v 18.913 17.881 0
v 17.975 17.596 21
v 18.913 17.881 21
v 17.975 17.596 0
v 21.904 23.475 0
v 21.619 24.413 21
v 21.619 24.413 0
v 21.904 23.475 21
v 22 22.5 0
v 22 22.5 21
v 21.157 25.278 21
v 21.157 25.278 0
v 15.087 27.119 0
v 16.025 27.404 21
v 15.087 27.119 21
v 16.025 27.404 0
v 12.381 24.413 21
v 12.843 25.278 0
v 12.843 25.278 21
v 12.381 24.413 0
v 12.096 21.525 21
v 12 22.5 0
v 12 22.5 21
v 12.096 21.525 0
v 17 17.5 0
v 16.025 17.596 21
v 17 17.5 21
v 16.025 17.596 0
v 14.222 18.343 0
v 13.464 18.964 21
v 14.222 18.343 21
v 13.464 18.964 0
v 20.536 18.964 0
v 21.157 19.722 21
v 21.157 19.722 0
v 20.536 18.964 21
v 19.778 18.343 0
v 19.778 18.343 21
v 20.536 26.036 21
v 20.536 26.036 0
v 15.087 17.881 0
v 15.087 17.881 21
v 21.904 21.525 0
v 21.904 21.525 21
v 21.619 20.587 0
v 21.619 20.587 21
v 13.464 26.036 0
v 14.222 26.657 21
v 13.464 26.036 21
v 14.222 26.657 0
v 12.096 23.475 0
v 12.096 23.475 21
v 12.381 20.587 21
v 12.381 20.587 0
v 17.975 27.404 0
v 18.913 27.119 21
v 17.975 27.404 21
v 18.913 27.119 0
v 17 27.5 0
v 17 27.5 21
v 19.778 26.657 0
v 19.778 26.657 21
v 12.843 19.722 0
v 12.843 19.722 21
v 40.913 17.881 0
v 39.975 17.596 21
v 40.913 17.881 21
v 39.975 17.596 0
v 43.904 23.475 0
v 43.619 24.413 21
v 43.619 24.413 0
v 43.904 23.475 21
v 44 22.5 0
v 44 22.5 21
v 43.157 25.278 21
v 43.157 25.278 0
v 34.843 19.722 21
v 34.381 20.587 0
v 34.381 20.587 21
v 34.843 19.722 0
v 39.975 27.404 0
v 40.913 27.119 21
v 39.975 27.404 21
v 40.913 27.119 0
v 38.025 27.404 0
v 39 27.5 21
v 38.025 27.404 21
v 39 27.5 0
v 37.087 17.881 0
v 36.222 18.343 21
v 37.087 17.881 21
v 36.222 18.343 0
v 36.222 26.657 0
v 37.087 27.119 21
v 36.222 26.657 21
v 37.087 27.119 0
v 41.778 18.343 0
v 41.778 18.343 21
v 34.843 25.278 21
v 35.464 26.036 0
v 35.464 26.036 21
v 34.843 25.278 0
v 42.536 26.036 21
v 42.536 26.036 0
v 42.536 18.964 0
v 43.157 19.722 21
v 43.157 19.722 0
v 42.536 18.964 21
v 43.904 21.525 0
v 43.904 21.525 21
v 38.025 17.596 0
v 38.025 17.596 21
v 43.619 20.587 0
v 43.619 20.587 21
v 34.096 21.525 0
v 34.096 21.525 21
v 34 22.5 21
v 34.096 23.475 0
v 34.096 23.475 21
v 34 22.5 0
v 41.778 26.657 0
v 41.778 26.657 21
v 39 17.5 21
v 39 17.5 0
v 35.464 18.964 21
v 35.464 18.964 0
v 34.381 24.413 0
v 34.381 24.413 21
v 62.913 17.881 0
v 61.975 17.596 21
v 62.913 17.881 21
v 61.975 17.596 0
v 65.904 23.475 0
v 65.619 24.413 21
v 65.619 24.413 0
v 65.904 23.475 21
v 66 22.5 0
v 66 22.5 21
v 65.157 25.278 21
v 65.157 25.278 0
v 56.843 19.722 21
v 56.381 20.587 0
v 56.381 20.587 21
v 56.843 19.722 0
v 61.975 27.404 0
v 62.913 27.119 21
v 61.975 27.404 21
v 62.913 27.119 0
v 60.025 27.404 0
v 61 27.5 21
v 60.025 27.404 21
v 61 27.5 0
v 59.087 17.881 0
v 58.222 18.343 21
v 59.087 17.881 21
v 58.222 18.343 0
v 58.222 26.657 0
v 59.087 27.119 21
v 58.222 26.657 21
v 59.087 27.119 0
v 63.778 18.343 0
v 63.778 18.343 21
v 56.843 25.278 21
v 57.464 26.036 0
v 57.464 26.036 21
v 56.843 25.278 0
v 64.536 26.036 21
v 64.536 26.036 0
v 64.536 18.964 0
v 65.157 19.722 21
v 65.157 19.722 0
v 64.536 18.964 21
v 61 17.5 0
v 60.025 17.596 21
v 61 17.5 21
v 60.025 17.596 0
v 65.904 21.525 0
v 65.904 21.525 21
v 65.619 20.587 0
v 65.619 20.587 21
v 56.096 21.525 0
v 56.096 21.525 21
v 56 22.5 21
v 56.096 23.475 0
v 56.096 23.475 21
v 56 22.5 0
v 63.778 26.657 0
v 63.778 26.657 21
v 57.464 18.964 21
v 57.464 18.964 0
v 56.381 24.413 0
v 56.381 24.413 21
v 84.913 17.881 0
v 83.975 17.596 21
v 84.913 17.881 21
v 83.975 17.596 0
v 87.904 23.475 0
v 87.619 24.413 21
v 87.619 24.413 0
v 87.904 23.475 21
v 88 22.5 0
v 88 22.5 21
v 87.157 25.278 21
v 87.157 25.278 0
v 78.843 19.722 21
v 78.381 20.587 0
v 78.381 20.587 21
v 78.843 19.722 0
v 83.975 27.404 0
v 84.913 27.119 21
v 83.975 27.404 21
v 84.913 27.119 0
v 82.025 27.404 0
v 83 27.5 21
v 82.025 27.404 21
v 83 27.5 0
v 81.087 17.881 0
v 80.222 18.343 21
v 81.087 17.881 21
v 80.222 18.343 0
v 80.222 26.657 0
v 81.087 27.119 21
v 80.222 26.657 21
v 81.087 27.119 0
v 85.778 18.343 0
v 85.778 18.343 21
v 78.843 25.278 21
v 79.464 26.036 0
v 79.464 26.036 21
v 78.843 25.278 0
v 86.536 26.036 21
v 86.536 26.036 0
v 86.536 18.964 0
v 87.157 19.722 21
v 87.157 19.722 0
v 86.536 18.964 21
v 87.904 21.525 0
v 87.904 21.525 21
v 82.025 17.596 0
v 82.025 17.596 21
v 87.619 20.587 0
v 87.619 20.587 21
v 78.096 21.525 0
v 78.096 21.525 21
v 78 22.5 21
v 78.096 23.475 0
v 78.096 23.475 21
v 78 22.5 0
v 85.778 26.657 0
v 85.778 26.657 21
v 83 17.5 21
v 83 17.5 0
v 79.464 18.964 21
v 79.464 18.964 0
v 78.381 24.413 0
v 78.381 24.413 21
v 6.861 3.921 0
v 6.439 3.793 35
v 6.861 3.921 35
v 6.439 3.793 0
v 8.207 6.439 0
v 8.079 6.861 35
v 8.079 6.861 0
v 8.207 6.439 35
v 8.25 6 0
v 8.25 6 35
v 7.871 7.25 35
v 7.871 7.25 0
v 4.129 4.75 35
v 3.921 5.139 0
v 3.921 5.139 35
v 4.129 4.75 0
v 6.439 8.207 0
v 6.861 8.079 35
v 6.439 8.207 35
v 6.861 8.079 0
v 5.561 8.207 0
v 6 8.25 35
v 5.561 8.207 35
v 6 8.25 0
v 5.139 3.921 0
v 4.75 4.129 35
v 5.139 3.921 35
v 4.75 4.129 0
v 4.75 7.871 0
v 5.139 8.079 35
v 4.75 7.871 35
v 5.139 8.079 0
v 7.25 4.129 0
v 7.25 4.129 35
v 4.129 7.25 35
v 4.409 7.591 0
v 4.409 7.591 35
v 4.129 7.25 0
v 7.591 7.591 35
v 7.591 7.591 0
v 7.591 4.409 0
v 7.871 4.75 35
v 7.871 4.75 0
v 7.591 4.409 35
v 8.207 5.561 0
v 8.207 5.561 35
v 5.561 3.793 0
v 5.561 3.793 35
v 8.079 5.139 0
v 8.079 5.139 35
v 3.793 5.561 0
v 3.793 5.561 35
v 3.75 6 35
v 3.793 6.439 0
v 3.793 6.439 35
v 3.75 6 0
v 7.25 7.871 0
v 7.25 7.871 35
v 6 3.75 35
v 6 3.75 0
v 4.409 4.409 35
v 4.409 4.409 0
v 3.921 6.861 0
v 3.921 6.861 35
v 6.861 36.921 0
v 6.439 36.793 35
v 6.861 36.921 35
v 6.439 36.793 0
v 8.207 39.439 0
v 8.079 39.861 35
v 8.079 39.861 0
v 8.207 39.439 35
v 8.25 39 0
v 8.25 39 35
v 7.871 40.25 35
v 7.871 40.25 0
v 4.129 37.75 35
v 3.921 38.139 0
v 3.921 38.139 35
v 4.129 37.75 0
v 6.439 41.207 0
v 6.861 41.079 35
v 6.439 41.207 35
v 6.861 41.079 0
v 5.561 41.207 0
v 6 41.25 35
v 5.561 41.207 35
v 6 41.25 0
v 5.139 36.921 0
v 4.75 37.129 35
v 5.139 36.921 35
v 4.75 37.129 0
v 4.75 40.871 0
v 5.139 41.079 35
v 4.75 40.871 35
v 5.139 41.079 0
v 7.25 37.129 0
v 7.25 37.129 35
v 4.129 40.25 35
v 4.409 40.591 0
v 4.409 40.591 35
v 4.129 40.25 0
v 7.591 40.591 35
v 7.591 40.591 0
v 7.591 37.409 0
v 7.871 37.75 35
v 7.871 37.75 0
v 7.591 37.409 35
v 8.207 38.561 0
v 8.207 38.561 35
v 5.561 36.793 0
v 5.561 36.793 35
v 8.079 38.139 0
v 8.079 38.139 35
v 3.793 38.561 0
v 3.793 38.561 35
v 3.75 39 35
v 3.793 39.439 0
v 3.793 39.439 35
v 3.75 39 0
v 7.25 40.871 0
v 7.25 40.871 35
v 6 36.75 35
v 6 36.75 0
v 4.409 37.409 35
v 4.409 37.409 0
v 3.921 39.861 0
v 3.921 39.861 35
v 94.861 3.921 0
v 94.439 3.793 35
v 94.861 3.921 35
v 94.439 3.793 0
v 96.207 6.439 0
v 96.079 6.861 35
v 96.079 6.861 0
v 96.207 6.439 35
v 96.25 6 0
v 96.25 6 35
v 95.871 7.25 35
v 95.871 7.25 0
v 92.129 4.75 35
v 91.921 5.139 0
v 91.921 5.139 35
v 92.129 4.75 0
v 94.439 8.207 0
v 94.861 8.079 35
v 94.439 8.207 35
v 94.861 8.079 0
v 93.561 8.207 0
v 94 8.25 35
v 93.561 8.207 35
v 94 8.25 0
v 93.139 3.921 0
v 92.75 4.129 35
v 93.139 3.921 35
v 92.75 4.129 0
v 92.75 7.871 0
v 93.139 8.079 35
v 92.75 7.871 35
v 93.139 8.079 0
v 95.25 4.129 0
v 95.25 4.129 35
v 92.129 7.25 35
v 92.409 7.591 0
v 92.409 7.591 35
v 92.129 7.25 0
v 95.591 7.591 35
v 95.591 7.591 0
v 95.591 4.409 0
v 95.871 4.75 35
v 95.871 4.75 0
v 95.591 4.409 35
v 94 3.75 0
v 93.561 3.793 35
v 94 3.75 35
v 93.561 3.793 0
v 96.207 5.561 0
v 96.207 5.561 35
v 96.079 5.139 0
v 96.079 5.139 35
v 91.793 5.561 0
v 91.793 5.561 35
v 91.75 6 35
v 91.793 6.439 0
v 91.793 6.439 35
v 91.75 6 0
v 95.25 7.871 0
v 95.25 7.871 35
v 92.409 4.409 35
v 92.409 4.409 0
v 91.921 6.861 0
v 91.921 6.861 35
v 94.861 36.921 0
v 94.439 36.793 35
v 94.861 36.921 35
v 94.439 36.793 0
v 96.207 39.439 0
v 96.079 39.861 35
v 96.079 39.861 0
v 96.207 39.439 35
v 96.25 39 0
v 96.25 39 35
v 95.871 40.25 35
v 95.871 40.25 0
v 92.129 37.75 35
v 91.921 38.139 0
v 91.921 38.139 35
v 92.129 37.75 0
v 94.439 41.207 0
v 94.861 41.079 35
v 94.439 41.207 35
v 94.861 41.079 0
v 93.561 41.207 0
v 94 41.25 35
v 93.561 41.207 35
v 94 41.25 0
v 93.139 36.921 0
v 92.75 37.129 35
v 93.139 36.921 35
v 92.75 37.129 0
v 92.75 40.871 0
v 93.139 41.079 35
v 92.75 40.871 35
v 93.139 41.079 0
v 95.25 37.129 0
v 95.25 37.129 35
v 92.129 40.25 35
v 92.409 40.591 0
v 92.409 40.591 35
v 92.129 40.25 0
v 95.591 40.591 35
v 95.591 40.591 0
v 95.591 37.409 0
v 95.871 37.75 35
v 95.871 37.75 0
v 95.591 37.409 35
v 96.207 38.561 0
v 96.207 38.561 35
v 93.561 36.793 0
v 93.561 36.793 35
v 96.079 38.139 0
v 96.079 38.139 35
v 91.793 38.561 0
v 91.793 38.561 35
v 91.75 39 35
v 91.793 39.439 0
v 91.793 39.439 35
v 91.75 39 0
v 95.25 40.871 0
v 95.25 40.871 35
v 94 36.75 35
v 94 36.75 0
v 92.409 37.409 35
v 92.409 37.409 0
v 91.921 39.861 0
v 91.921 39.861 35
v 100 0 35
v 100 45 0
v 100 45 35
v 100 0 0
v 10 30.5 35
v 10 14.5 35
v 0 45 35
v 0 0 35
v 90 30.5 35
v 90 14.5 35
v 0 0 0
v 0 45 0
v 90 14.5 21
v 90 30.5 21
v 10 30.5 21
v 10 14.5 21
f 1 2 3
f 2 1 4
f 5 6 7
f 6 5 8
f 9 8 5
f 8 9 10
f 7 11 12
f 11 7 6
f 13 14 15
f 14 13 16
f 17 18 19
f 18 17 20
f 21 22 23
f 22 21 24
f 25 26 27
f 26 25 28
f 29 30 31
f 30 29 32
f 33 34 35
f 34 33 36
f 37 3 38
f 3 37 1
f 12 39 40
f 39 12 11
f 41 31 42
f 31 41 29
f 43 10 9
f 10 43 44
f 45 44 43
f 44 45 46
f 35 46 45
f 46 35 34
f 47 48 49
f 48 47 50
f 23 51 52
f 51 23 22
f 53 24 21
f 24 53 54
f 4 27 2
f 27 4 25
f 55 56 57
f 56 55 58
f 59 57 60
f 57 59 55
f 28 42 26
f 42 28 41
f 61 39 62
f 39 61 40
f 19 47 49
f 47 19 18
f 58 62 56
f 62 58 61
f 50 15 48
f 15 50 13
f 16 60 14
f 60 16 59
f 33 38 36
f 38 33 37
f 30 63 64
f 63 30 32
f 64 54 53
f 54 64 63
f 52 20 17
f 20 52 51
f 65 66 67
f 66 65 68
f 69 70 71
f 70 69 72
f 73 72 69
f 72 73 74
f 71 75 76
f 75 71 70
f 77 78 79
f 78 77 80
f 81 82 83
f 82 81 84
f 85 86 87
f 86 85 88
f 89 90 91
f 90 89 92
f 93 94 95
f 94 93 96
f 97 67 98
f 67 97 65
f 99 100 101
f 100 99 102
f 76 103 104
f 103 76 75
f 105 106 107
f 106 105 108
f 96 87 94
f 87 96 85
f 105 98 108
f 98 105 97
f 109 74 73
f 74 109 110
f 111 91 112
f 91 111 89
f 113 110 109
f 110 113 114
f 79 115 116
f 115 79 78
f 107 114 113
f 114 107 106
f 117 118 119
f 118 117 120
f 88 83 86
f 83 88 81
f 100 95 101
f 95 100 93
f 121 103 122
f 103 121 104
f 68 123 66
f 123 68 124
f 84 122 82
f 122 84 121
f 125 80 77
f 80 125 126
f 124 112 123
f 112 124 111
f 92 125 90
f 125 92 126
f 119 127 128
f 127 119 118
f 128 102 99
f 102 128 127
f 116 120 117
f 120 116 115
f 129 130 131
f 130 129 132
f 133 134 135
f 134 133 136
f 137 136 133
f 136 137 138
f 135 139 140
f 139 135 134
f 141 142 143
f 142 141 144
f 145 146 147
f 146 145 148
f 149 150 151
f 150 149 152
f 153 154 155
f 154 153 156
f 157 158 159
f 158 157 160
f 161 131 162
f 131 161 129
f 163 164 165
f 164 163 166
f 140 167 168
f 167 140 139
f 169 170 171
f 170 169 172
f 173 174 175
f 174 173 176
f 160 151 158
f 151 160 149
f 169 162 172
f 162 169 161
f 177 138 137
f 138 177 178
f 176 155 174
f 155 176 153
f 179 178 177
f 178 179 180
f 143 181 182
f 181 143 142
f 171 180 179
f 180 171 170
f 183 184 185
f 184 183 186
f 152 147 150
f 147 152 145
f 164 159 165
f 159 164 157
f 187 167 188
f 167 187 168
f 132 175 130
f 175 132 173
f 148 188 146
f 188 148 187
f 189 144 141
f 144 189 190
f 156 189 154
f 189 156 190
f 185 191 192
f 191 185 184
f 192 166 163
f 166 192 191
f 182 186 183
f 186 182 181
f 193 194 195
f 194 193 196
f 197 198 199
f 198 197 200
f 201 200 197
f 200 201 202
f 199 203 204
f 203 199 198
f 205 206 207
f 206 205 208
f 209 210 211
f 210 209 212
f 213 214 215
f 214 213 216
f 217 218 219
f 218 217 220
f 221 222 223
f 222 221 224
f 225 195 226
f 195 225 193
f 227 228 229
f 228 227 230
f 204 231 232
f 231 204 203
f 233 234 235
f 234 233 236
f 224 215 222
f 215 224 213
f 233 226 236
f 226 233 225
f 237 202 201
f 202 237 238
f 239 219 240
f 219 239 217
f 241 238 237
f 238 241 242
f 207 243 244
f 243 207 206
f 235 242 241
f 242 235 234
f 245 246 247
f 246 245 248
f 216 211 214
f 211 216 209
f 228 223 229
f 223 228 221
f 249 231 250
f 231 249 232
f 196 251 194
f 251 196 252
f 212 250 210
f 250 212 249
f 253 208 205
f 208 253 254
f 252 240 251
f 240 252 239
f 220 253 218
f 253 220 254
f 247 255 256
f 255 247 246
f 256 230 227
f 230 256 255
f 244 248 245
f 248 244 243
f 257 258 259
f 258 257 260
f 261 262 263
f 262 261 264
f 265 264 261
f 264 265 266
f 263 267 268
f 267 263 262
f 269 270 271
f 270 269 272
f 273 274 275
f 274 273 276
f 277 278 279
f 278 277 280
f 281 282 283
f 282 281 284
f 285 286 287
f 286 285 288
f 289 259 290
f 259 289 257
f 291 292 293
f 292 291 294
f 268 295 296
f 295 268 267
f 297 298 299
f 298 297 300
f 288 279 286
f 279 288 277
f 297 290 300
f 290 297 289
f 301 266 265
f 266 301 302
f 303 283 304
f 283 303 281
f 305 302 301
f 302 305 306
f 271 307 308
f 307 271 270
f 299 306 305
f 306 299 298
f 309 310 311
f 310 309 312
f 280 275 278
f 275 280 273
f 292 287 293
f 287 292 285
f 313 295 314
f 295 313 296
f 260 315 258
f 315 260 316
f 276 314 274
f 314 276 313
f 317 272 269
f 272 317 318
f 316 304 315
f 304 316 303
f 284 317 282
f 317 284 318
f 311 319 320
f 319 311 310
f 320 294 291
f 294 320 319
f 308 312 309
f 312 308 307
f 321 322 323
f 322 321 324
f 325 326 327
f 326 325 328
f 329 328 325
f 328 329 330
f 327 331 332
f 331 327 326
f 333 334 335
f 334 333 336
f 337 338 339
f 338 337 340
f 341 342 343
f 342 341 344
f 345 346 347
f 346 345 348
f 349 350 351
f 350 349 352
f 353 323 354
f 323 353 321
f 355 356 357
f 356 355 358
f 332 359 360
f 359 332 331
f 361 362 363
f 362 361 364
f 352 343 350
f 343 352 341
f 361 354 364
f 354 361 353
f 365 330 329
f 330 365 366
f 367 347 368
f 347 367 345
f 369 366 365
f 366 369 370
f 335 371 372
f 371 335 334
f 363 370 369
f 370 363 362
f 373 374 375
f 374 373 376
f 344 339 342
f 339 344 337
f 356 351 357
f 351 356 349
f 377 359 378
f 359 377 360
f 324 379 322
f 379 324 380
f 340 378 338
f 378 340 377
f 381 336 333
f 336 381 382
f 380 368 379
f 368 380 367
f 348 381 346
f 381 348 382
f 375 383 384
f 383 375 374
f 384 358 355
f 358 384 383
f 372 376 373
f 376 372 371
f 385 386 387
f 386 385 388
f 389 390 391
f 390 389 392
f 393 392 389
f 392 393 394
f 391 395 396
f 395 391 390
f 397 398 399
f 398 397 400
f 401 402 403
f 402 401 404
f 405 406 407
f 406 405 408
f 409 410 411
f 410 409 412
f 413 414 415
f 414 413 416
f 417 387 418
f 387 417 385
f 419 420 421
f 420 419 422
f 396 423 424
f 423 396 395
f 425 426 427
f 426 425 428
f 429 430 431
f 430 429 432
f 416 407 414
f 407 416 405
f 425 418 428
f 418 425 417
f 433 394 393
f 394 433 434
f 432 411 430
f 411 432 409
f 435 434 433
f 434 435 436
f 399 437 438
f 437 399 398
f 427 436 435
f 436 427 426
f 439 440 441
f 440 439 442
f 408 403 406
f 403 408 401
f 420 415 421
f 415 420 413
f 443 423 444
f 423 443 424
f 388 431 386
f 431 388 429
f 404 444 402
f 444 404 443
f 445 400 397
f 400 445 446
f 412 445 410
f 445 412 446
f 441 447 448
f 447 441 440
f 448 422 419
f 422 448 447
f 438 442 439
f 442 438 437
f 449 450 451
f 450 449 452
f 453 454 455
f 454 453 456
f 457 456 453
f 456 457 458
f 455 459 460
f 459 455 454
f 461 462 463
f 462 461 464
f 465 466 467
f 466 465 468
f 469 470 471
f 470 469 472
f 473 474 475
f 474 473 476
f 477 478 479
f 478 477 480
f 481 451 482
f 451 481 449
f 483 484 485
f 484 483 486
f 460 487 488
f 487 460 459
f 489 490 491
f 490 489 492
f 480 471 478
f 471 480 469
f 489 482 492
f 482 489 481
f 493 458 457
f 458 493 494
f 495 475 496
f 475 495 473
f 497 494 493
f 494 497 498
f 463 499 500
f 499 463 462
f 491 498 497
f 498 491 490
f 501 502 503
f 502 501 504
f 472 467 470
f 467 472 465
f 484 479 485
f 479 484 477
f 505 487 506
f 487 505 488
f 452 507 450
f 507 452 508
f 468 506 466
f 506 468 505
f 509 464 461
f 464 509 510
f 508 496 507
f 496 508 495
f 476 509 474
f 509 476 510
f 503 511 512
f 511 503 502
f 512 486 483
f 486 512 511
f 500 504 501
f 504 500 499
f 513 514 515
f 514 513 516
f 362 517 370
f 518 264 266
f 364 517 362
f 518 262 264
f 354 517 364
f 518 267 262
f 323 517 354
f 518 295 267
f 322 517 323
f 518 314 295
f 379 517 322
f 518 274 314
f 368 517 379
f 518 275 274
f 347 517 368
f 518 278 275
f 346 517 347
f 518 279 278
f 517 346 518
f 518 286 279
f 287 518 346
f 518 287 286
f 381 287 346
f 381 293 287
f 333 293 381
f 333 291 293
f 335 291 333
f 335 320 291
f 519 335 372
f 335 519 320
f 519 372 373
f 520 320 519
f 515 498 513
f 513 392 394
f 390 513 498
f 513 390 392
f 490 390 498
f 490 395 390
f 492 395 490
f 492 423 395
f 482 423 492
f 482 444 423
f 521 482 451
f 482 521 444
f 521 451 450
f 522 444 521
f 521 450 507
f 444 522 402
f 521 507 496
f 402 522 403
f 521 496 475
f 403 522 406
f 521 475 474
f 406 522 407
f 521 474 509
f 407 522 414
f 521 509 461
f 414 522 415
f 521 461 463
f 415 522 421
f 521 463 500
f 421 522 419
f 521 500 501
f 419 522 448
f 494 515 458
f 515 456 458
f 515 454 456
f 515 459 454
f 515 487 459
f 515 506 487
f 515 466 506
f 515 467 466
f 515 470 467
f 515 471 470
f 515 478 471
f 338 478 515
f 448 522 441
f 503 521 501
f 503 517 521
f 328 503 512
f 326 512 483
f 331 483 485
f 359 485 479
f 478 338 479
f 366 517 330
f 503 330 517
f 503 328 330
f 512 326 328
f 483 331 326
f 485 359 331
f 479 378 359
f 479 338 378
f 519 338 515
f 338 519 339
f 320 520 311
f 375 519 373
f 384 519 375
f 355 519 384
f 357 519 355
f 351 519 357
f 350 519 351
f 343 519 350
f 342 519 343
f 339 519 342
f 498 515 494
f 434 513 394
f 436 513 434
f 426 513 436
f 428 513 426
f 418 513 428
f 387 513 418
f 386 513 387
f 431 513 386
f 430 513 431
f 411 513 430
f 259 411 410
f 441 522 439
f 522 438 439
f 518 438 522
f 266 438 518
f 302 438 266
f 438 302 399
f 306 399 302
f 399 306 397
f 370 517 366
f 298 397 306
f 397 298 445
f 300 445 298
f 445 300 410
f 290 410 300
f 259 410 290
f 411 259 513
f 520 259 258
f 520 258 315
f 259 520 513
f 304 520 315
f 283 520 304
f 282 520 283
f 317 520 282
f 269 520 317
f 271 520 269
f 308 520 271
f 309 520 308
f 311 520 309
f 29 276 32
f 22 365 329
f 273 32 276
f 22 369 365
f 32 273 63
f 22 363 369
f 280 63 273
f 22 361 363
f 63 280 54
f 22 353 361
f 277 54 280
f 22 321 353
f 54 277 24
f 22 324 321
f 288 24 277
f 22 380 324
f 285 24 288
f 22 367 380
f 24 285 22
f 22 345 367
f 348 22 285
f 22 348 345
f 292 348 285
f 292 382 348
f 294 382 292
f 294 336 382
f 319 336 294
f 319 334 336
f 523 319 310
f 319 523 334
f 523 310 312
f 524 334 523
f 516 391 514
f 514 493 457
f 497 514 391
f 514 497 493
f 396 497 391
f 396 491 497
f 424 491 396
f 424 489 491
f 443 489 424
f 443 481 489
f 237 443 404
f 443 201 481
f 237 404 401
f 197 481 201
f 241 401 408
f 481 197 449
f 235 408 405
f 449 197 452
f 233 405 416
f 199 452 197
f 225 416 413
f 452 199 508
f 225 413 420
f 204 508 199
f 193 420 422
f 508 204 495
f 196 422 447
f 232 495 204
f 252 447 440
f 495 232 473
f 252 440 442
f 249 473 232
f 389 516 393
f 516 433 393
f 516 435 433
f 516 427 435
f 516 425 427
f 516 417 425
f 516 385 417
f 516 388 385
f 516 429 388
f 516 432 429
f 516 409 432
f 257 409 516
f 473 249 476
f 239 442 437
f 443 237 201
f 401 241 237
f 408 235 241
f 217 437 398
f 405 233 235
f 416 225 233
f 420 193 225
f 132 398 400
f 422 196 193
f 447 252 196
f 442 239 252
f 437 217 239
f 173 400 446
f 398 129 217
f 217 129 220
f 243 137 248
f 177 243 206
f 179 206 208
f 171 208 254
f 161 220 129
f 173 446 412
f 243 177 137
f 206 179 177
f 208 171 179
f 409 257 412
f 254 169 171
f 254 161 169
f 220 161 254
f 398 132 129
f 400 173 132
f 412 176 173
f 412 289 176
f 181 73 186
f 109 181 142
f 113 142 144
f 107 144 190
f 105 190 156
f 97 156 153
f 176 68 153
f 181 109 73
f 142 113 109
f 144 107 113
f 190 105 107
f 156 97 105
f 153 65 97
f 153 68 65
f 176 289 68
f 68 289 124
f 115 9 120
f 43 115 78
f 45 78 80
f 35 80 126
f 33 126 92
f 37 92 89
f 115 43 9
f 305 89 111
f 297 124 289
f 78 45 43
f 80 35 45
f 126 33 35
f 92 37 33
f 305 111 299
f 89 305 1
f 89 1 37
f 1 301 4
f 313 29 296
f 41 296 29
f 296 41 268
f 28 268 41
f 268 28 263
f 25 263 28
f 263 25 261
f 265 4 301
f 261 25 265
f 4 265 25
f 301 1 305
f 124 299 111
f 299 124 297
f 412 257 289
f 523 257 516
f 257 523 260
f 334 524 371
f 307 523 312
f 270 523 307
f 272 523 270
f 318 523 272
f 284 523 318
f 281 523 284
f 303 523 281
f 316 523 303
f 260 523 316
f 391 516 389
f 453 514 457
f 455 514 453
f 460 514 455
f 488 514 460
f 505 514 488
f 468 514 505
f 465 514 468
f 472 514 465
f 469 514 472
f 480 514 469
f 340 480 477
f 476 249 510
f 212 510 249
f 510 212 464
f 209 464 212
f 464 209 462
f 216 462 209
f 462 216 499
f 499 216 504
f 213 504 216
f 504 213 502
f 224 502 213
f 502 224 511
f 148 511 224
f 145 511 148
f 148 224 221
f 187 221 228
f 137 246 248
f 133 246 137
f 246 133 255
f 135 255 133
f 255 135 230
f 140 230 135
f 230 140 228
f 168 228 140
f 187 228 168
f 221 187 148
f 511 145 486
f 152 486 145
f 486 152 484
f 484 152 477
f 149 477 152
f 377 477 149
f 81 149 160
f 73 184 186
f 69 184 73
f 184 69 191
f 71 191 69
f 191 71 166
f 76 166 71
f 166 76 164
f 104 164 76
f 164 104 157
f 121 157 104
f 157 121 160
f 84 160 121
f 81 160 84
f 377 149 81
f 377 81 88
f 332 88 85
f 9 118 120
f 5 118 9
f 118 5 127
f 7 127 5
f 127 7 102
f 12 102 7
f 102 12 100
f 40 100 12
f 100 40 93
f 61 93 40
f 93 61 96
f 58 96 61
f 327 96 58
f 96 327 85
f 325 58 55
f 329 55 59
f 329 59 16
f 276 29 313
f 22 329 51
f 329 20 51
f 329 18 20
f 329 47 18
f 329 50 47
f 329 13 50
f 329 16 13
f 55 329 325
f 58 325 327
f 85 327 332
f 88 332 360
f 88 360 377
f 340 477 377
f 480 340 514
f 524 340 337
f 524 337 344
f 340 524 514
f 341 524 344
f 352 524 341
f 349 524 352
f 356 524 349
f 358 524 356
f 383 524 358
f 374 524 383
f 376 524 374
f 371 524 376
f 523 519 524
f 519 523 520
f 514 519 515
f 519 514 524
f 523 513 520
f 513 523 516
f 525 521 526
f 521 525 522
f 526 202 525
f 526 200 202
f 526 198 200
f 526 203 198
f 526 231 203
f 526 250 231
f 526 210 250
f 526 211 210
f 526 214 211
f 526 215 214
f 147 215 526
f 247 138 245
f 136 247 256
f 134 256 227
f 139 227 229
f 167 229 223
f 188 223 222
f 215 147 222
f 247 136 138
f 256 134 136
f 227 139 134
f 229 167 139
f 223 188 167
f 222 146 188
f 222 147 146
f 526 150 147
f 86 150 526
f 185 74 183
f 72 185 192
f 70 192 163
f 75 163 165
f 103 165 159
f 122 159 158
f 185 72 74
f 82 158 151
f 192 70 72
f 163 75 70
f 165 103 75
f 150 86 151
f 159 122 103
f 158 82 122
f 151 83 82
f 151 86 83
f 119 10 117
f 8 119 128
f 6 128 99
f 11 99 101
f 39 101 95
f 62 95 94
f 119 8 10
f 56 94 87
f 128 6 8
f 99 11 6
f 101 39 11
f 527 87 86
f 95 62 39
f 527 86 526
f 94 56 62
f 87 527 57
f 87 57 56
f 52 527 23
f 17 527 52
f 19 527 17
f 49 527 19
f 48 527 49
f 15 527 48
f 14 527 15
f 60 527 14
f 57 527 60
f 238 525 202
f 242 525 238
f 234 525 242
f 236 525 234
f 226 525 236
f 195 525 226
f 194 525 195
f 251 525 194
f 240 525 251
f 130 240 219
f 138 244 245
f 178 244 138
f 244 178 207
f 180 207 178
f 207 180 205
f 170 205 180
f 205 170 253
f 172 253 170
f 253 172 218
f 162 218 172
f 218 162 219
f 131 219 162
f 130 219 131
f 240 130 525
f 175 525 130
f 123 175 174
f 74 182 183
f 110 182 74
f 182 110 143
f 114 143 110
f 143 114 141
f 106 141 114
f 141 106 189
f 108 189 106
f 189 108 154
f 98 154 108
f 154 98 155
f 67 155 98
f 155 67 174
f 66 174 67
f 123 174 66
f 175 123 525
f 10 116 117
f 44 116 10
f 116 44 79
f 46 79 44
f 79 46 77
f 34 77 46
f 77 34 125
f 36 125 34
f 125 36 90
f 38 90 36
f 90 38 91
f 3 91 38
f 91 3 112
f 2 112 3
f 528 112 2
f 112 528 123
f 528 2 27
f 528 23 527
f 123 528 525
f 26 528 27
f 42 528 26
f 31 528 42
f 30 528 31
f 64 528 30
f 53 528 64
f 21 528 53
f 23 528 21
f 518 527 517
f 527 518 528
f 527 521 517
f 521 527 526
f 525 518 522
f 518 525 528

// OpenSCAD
$fn = 32;

// ----------------------------------------------------------------------
// Manifold block: gallery_top manifold
// ----------------------------------------------------------------------

// --- parameters (mm) ---
block_l = 100;            // block length, X
block_w = 45;             // block width, Y
block_h = 35;             // block height, Z
port_d = 10;              // port bore diameter
port_pitch = 22;          // port pitch along X
gallery_d = 16;           // top gallery width, Y
gallery_depth = 14;       // gallery pocket depth
wall_p = 10;              // gallery end wall thickness, X
mnt_d = 4.5;              // mounting hole diameter
mnt_in = 6;               // mounting hole inset from the edges
fit_tol = 0.1;            // tolerance for press fits, mm
free_tol = 0.5;           // tolerance for clearance fits, mm

n_ports = 4;  // ports in the row
port_x0 = (block_l - (n_ports - 1) * port_pitch) / 2;  // first port X

difference() {
  cube([block_l, block_w, block_h]);
  for (i = [0 : n_ports - 1])
    translate([port_x0 + i * port_pitch, block_w / 2, -1])
      cylinder(h = block_h + 2, d = port_d);
  translate([wall_p, block_w / 2 - gallery_d / 2, block_h - gallery_depth])
    cube([block_l - 2 * wall_p, gallery_d, gallery_depth + 1]);
  for (cx = [mnt_in, block_l - mnt_in])
    for (cy = [mnt_in, block_w - mnt_in])
      translate([cx, cy, -1]) cylinder(h = block_h + 2, d = mnt_d);
}
